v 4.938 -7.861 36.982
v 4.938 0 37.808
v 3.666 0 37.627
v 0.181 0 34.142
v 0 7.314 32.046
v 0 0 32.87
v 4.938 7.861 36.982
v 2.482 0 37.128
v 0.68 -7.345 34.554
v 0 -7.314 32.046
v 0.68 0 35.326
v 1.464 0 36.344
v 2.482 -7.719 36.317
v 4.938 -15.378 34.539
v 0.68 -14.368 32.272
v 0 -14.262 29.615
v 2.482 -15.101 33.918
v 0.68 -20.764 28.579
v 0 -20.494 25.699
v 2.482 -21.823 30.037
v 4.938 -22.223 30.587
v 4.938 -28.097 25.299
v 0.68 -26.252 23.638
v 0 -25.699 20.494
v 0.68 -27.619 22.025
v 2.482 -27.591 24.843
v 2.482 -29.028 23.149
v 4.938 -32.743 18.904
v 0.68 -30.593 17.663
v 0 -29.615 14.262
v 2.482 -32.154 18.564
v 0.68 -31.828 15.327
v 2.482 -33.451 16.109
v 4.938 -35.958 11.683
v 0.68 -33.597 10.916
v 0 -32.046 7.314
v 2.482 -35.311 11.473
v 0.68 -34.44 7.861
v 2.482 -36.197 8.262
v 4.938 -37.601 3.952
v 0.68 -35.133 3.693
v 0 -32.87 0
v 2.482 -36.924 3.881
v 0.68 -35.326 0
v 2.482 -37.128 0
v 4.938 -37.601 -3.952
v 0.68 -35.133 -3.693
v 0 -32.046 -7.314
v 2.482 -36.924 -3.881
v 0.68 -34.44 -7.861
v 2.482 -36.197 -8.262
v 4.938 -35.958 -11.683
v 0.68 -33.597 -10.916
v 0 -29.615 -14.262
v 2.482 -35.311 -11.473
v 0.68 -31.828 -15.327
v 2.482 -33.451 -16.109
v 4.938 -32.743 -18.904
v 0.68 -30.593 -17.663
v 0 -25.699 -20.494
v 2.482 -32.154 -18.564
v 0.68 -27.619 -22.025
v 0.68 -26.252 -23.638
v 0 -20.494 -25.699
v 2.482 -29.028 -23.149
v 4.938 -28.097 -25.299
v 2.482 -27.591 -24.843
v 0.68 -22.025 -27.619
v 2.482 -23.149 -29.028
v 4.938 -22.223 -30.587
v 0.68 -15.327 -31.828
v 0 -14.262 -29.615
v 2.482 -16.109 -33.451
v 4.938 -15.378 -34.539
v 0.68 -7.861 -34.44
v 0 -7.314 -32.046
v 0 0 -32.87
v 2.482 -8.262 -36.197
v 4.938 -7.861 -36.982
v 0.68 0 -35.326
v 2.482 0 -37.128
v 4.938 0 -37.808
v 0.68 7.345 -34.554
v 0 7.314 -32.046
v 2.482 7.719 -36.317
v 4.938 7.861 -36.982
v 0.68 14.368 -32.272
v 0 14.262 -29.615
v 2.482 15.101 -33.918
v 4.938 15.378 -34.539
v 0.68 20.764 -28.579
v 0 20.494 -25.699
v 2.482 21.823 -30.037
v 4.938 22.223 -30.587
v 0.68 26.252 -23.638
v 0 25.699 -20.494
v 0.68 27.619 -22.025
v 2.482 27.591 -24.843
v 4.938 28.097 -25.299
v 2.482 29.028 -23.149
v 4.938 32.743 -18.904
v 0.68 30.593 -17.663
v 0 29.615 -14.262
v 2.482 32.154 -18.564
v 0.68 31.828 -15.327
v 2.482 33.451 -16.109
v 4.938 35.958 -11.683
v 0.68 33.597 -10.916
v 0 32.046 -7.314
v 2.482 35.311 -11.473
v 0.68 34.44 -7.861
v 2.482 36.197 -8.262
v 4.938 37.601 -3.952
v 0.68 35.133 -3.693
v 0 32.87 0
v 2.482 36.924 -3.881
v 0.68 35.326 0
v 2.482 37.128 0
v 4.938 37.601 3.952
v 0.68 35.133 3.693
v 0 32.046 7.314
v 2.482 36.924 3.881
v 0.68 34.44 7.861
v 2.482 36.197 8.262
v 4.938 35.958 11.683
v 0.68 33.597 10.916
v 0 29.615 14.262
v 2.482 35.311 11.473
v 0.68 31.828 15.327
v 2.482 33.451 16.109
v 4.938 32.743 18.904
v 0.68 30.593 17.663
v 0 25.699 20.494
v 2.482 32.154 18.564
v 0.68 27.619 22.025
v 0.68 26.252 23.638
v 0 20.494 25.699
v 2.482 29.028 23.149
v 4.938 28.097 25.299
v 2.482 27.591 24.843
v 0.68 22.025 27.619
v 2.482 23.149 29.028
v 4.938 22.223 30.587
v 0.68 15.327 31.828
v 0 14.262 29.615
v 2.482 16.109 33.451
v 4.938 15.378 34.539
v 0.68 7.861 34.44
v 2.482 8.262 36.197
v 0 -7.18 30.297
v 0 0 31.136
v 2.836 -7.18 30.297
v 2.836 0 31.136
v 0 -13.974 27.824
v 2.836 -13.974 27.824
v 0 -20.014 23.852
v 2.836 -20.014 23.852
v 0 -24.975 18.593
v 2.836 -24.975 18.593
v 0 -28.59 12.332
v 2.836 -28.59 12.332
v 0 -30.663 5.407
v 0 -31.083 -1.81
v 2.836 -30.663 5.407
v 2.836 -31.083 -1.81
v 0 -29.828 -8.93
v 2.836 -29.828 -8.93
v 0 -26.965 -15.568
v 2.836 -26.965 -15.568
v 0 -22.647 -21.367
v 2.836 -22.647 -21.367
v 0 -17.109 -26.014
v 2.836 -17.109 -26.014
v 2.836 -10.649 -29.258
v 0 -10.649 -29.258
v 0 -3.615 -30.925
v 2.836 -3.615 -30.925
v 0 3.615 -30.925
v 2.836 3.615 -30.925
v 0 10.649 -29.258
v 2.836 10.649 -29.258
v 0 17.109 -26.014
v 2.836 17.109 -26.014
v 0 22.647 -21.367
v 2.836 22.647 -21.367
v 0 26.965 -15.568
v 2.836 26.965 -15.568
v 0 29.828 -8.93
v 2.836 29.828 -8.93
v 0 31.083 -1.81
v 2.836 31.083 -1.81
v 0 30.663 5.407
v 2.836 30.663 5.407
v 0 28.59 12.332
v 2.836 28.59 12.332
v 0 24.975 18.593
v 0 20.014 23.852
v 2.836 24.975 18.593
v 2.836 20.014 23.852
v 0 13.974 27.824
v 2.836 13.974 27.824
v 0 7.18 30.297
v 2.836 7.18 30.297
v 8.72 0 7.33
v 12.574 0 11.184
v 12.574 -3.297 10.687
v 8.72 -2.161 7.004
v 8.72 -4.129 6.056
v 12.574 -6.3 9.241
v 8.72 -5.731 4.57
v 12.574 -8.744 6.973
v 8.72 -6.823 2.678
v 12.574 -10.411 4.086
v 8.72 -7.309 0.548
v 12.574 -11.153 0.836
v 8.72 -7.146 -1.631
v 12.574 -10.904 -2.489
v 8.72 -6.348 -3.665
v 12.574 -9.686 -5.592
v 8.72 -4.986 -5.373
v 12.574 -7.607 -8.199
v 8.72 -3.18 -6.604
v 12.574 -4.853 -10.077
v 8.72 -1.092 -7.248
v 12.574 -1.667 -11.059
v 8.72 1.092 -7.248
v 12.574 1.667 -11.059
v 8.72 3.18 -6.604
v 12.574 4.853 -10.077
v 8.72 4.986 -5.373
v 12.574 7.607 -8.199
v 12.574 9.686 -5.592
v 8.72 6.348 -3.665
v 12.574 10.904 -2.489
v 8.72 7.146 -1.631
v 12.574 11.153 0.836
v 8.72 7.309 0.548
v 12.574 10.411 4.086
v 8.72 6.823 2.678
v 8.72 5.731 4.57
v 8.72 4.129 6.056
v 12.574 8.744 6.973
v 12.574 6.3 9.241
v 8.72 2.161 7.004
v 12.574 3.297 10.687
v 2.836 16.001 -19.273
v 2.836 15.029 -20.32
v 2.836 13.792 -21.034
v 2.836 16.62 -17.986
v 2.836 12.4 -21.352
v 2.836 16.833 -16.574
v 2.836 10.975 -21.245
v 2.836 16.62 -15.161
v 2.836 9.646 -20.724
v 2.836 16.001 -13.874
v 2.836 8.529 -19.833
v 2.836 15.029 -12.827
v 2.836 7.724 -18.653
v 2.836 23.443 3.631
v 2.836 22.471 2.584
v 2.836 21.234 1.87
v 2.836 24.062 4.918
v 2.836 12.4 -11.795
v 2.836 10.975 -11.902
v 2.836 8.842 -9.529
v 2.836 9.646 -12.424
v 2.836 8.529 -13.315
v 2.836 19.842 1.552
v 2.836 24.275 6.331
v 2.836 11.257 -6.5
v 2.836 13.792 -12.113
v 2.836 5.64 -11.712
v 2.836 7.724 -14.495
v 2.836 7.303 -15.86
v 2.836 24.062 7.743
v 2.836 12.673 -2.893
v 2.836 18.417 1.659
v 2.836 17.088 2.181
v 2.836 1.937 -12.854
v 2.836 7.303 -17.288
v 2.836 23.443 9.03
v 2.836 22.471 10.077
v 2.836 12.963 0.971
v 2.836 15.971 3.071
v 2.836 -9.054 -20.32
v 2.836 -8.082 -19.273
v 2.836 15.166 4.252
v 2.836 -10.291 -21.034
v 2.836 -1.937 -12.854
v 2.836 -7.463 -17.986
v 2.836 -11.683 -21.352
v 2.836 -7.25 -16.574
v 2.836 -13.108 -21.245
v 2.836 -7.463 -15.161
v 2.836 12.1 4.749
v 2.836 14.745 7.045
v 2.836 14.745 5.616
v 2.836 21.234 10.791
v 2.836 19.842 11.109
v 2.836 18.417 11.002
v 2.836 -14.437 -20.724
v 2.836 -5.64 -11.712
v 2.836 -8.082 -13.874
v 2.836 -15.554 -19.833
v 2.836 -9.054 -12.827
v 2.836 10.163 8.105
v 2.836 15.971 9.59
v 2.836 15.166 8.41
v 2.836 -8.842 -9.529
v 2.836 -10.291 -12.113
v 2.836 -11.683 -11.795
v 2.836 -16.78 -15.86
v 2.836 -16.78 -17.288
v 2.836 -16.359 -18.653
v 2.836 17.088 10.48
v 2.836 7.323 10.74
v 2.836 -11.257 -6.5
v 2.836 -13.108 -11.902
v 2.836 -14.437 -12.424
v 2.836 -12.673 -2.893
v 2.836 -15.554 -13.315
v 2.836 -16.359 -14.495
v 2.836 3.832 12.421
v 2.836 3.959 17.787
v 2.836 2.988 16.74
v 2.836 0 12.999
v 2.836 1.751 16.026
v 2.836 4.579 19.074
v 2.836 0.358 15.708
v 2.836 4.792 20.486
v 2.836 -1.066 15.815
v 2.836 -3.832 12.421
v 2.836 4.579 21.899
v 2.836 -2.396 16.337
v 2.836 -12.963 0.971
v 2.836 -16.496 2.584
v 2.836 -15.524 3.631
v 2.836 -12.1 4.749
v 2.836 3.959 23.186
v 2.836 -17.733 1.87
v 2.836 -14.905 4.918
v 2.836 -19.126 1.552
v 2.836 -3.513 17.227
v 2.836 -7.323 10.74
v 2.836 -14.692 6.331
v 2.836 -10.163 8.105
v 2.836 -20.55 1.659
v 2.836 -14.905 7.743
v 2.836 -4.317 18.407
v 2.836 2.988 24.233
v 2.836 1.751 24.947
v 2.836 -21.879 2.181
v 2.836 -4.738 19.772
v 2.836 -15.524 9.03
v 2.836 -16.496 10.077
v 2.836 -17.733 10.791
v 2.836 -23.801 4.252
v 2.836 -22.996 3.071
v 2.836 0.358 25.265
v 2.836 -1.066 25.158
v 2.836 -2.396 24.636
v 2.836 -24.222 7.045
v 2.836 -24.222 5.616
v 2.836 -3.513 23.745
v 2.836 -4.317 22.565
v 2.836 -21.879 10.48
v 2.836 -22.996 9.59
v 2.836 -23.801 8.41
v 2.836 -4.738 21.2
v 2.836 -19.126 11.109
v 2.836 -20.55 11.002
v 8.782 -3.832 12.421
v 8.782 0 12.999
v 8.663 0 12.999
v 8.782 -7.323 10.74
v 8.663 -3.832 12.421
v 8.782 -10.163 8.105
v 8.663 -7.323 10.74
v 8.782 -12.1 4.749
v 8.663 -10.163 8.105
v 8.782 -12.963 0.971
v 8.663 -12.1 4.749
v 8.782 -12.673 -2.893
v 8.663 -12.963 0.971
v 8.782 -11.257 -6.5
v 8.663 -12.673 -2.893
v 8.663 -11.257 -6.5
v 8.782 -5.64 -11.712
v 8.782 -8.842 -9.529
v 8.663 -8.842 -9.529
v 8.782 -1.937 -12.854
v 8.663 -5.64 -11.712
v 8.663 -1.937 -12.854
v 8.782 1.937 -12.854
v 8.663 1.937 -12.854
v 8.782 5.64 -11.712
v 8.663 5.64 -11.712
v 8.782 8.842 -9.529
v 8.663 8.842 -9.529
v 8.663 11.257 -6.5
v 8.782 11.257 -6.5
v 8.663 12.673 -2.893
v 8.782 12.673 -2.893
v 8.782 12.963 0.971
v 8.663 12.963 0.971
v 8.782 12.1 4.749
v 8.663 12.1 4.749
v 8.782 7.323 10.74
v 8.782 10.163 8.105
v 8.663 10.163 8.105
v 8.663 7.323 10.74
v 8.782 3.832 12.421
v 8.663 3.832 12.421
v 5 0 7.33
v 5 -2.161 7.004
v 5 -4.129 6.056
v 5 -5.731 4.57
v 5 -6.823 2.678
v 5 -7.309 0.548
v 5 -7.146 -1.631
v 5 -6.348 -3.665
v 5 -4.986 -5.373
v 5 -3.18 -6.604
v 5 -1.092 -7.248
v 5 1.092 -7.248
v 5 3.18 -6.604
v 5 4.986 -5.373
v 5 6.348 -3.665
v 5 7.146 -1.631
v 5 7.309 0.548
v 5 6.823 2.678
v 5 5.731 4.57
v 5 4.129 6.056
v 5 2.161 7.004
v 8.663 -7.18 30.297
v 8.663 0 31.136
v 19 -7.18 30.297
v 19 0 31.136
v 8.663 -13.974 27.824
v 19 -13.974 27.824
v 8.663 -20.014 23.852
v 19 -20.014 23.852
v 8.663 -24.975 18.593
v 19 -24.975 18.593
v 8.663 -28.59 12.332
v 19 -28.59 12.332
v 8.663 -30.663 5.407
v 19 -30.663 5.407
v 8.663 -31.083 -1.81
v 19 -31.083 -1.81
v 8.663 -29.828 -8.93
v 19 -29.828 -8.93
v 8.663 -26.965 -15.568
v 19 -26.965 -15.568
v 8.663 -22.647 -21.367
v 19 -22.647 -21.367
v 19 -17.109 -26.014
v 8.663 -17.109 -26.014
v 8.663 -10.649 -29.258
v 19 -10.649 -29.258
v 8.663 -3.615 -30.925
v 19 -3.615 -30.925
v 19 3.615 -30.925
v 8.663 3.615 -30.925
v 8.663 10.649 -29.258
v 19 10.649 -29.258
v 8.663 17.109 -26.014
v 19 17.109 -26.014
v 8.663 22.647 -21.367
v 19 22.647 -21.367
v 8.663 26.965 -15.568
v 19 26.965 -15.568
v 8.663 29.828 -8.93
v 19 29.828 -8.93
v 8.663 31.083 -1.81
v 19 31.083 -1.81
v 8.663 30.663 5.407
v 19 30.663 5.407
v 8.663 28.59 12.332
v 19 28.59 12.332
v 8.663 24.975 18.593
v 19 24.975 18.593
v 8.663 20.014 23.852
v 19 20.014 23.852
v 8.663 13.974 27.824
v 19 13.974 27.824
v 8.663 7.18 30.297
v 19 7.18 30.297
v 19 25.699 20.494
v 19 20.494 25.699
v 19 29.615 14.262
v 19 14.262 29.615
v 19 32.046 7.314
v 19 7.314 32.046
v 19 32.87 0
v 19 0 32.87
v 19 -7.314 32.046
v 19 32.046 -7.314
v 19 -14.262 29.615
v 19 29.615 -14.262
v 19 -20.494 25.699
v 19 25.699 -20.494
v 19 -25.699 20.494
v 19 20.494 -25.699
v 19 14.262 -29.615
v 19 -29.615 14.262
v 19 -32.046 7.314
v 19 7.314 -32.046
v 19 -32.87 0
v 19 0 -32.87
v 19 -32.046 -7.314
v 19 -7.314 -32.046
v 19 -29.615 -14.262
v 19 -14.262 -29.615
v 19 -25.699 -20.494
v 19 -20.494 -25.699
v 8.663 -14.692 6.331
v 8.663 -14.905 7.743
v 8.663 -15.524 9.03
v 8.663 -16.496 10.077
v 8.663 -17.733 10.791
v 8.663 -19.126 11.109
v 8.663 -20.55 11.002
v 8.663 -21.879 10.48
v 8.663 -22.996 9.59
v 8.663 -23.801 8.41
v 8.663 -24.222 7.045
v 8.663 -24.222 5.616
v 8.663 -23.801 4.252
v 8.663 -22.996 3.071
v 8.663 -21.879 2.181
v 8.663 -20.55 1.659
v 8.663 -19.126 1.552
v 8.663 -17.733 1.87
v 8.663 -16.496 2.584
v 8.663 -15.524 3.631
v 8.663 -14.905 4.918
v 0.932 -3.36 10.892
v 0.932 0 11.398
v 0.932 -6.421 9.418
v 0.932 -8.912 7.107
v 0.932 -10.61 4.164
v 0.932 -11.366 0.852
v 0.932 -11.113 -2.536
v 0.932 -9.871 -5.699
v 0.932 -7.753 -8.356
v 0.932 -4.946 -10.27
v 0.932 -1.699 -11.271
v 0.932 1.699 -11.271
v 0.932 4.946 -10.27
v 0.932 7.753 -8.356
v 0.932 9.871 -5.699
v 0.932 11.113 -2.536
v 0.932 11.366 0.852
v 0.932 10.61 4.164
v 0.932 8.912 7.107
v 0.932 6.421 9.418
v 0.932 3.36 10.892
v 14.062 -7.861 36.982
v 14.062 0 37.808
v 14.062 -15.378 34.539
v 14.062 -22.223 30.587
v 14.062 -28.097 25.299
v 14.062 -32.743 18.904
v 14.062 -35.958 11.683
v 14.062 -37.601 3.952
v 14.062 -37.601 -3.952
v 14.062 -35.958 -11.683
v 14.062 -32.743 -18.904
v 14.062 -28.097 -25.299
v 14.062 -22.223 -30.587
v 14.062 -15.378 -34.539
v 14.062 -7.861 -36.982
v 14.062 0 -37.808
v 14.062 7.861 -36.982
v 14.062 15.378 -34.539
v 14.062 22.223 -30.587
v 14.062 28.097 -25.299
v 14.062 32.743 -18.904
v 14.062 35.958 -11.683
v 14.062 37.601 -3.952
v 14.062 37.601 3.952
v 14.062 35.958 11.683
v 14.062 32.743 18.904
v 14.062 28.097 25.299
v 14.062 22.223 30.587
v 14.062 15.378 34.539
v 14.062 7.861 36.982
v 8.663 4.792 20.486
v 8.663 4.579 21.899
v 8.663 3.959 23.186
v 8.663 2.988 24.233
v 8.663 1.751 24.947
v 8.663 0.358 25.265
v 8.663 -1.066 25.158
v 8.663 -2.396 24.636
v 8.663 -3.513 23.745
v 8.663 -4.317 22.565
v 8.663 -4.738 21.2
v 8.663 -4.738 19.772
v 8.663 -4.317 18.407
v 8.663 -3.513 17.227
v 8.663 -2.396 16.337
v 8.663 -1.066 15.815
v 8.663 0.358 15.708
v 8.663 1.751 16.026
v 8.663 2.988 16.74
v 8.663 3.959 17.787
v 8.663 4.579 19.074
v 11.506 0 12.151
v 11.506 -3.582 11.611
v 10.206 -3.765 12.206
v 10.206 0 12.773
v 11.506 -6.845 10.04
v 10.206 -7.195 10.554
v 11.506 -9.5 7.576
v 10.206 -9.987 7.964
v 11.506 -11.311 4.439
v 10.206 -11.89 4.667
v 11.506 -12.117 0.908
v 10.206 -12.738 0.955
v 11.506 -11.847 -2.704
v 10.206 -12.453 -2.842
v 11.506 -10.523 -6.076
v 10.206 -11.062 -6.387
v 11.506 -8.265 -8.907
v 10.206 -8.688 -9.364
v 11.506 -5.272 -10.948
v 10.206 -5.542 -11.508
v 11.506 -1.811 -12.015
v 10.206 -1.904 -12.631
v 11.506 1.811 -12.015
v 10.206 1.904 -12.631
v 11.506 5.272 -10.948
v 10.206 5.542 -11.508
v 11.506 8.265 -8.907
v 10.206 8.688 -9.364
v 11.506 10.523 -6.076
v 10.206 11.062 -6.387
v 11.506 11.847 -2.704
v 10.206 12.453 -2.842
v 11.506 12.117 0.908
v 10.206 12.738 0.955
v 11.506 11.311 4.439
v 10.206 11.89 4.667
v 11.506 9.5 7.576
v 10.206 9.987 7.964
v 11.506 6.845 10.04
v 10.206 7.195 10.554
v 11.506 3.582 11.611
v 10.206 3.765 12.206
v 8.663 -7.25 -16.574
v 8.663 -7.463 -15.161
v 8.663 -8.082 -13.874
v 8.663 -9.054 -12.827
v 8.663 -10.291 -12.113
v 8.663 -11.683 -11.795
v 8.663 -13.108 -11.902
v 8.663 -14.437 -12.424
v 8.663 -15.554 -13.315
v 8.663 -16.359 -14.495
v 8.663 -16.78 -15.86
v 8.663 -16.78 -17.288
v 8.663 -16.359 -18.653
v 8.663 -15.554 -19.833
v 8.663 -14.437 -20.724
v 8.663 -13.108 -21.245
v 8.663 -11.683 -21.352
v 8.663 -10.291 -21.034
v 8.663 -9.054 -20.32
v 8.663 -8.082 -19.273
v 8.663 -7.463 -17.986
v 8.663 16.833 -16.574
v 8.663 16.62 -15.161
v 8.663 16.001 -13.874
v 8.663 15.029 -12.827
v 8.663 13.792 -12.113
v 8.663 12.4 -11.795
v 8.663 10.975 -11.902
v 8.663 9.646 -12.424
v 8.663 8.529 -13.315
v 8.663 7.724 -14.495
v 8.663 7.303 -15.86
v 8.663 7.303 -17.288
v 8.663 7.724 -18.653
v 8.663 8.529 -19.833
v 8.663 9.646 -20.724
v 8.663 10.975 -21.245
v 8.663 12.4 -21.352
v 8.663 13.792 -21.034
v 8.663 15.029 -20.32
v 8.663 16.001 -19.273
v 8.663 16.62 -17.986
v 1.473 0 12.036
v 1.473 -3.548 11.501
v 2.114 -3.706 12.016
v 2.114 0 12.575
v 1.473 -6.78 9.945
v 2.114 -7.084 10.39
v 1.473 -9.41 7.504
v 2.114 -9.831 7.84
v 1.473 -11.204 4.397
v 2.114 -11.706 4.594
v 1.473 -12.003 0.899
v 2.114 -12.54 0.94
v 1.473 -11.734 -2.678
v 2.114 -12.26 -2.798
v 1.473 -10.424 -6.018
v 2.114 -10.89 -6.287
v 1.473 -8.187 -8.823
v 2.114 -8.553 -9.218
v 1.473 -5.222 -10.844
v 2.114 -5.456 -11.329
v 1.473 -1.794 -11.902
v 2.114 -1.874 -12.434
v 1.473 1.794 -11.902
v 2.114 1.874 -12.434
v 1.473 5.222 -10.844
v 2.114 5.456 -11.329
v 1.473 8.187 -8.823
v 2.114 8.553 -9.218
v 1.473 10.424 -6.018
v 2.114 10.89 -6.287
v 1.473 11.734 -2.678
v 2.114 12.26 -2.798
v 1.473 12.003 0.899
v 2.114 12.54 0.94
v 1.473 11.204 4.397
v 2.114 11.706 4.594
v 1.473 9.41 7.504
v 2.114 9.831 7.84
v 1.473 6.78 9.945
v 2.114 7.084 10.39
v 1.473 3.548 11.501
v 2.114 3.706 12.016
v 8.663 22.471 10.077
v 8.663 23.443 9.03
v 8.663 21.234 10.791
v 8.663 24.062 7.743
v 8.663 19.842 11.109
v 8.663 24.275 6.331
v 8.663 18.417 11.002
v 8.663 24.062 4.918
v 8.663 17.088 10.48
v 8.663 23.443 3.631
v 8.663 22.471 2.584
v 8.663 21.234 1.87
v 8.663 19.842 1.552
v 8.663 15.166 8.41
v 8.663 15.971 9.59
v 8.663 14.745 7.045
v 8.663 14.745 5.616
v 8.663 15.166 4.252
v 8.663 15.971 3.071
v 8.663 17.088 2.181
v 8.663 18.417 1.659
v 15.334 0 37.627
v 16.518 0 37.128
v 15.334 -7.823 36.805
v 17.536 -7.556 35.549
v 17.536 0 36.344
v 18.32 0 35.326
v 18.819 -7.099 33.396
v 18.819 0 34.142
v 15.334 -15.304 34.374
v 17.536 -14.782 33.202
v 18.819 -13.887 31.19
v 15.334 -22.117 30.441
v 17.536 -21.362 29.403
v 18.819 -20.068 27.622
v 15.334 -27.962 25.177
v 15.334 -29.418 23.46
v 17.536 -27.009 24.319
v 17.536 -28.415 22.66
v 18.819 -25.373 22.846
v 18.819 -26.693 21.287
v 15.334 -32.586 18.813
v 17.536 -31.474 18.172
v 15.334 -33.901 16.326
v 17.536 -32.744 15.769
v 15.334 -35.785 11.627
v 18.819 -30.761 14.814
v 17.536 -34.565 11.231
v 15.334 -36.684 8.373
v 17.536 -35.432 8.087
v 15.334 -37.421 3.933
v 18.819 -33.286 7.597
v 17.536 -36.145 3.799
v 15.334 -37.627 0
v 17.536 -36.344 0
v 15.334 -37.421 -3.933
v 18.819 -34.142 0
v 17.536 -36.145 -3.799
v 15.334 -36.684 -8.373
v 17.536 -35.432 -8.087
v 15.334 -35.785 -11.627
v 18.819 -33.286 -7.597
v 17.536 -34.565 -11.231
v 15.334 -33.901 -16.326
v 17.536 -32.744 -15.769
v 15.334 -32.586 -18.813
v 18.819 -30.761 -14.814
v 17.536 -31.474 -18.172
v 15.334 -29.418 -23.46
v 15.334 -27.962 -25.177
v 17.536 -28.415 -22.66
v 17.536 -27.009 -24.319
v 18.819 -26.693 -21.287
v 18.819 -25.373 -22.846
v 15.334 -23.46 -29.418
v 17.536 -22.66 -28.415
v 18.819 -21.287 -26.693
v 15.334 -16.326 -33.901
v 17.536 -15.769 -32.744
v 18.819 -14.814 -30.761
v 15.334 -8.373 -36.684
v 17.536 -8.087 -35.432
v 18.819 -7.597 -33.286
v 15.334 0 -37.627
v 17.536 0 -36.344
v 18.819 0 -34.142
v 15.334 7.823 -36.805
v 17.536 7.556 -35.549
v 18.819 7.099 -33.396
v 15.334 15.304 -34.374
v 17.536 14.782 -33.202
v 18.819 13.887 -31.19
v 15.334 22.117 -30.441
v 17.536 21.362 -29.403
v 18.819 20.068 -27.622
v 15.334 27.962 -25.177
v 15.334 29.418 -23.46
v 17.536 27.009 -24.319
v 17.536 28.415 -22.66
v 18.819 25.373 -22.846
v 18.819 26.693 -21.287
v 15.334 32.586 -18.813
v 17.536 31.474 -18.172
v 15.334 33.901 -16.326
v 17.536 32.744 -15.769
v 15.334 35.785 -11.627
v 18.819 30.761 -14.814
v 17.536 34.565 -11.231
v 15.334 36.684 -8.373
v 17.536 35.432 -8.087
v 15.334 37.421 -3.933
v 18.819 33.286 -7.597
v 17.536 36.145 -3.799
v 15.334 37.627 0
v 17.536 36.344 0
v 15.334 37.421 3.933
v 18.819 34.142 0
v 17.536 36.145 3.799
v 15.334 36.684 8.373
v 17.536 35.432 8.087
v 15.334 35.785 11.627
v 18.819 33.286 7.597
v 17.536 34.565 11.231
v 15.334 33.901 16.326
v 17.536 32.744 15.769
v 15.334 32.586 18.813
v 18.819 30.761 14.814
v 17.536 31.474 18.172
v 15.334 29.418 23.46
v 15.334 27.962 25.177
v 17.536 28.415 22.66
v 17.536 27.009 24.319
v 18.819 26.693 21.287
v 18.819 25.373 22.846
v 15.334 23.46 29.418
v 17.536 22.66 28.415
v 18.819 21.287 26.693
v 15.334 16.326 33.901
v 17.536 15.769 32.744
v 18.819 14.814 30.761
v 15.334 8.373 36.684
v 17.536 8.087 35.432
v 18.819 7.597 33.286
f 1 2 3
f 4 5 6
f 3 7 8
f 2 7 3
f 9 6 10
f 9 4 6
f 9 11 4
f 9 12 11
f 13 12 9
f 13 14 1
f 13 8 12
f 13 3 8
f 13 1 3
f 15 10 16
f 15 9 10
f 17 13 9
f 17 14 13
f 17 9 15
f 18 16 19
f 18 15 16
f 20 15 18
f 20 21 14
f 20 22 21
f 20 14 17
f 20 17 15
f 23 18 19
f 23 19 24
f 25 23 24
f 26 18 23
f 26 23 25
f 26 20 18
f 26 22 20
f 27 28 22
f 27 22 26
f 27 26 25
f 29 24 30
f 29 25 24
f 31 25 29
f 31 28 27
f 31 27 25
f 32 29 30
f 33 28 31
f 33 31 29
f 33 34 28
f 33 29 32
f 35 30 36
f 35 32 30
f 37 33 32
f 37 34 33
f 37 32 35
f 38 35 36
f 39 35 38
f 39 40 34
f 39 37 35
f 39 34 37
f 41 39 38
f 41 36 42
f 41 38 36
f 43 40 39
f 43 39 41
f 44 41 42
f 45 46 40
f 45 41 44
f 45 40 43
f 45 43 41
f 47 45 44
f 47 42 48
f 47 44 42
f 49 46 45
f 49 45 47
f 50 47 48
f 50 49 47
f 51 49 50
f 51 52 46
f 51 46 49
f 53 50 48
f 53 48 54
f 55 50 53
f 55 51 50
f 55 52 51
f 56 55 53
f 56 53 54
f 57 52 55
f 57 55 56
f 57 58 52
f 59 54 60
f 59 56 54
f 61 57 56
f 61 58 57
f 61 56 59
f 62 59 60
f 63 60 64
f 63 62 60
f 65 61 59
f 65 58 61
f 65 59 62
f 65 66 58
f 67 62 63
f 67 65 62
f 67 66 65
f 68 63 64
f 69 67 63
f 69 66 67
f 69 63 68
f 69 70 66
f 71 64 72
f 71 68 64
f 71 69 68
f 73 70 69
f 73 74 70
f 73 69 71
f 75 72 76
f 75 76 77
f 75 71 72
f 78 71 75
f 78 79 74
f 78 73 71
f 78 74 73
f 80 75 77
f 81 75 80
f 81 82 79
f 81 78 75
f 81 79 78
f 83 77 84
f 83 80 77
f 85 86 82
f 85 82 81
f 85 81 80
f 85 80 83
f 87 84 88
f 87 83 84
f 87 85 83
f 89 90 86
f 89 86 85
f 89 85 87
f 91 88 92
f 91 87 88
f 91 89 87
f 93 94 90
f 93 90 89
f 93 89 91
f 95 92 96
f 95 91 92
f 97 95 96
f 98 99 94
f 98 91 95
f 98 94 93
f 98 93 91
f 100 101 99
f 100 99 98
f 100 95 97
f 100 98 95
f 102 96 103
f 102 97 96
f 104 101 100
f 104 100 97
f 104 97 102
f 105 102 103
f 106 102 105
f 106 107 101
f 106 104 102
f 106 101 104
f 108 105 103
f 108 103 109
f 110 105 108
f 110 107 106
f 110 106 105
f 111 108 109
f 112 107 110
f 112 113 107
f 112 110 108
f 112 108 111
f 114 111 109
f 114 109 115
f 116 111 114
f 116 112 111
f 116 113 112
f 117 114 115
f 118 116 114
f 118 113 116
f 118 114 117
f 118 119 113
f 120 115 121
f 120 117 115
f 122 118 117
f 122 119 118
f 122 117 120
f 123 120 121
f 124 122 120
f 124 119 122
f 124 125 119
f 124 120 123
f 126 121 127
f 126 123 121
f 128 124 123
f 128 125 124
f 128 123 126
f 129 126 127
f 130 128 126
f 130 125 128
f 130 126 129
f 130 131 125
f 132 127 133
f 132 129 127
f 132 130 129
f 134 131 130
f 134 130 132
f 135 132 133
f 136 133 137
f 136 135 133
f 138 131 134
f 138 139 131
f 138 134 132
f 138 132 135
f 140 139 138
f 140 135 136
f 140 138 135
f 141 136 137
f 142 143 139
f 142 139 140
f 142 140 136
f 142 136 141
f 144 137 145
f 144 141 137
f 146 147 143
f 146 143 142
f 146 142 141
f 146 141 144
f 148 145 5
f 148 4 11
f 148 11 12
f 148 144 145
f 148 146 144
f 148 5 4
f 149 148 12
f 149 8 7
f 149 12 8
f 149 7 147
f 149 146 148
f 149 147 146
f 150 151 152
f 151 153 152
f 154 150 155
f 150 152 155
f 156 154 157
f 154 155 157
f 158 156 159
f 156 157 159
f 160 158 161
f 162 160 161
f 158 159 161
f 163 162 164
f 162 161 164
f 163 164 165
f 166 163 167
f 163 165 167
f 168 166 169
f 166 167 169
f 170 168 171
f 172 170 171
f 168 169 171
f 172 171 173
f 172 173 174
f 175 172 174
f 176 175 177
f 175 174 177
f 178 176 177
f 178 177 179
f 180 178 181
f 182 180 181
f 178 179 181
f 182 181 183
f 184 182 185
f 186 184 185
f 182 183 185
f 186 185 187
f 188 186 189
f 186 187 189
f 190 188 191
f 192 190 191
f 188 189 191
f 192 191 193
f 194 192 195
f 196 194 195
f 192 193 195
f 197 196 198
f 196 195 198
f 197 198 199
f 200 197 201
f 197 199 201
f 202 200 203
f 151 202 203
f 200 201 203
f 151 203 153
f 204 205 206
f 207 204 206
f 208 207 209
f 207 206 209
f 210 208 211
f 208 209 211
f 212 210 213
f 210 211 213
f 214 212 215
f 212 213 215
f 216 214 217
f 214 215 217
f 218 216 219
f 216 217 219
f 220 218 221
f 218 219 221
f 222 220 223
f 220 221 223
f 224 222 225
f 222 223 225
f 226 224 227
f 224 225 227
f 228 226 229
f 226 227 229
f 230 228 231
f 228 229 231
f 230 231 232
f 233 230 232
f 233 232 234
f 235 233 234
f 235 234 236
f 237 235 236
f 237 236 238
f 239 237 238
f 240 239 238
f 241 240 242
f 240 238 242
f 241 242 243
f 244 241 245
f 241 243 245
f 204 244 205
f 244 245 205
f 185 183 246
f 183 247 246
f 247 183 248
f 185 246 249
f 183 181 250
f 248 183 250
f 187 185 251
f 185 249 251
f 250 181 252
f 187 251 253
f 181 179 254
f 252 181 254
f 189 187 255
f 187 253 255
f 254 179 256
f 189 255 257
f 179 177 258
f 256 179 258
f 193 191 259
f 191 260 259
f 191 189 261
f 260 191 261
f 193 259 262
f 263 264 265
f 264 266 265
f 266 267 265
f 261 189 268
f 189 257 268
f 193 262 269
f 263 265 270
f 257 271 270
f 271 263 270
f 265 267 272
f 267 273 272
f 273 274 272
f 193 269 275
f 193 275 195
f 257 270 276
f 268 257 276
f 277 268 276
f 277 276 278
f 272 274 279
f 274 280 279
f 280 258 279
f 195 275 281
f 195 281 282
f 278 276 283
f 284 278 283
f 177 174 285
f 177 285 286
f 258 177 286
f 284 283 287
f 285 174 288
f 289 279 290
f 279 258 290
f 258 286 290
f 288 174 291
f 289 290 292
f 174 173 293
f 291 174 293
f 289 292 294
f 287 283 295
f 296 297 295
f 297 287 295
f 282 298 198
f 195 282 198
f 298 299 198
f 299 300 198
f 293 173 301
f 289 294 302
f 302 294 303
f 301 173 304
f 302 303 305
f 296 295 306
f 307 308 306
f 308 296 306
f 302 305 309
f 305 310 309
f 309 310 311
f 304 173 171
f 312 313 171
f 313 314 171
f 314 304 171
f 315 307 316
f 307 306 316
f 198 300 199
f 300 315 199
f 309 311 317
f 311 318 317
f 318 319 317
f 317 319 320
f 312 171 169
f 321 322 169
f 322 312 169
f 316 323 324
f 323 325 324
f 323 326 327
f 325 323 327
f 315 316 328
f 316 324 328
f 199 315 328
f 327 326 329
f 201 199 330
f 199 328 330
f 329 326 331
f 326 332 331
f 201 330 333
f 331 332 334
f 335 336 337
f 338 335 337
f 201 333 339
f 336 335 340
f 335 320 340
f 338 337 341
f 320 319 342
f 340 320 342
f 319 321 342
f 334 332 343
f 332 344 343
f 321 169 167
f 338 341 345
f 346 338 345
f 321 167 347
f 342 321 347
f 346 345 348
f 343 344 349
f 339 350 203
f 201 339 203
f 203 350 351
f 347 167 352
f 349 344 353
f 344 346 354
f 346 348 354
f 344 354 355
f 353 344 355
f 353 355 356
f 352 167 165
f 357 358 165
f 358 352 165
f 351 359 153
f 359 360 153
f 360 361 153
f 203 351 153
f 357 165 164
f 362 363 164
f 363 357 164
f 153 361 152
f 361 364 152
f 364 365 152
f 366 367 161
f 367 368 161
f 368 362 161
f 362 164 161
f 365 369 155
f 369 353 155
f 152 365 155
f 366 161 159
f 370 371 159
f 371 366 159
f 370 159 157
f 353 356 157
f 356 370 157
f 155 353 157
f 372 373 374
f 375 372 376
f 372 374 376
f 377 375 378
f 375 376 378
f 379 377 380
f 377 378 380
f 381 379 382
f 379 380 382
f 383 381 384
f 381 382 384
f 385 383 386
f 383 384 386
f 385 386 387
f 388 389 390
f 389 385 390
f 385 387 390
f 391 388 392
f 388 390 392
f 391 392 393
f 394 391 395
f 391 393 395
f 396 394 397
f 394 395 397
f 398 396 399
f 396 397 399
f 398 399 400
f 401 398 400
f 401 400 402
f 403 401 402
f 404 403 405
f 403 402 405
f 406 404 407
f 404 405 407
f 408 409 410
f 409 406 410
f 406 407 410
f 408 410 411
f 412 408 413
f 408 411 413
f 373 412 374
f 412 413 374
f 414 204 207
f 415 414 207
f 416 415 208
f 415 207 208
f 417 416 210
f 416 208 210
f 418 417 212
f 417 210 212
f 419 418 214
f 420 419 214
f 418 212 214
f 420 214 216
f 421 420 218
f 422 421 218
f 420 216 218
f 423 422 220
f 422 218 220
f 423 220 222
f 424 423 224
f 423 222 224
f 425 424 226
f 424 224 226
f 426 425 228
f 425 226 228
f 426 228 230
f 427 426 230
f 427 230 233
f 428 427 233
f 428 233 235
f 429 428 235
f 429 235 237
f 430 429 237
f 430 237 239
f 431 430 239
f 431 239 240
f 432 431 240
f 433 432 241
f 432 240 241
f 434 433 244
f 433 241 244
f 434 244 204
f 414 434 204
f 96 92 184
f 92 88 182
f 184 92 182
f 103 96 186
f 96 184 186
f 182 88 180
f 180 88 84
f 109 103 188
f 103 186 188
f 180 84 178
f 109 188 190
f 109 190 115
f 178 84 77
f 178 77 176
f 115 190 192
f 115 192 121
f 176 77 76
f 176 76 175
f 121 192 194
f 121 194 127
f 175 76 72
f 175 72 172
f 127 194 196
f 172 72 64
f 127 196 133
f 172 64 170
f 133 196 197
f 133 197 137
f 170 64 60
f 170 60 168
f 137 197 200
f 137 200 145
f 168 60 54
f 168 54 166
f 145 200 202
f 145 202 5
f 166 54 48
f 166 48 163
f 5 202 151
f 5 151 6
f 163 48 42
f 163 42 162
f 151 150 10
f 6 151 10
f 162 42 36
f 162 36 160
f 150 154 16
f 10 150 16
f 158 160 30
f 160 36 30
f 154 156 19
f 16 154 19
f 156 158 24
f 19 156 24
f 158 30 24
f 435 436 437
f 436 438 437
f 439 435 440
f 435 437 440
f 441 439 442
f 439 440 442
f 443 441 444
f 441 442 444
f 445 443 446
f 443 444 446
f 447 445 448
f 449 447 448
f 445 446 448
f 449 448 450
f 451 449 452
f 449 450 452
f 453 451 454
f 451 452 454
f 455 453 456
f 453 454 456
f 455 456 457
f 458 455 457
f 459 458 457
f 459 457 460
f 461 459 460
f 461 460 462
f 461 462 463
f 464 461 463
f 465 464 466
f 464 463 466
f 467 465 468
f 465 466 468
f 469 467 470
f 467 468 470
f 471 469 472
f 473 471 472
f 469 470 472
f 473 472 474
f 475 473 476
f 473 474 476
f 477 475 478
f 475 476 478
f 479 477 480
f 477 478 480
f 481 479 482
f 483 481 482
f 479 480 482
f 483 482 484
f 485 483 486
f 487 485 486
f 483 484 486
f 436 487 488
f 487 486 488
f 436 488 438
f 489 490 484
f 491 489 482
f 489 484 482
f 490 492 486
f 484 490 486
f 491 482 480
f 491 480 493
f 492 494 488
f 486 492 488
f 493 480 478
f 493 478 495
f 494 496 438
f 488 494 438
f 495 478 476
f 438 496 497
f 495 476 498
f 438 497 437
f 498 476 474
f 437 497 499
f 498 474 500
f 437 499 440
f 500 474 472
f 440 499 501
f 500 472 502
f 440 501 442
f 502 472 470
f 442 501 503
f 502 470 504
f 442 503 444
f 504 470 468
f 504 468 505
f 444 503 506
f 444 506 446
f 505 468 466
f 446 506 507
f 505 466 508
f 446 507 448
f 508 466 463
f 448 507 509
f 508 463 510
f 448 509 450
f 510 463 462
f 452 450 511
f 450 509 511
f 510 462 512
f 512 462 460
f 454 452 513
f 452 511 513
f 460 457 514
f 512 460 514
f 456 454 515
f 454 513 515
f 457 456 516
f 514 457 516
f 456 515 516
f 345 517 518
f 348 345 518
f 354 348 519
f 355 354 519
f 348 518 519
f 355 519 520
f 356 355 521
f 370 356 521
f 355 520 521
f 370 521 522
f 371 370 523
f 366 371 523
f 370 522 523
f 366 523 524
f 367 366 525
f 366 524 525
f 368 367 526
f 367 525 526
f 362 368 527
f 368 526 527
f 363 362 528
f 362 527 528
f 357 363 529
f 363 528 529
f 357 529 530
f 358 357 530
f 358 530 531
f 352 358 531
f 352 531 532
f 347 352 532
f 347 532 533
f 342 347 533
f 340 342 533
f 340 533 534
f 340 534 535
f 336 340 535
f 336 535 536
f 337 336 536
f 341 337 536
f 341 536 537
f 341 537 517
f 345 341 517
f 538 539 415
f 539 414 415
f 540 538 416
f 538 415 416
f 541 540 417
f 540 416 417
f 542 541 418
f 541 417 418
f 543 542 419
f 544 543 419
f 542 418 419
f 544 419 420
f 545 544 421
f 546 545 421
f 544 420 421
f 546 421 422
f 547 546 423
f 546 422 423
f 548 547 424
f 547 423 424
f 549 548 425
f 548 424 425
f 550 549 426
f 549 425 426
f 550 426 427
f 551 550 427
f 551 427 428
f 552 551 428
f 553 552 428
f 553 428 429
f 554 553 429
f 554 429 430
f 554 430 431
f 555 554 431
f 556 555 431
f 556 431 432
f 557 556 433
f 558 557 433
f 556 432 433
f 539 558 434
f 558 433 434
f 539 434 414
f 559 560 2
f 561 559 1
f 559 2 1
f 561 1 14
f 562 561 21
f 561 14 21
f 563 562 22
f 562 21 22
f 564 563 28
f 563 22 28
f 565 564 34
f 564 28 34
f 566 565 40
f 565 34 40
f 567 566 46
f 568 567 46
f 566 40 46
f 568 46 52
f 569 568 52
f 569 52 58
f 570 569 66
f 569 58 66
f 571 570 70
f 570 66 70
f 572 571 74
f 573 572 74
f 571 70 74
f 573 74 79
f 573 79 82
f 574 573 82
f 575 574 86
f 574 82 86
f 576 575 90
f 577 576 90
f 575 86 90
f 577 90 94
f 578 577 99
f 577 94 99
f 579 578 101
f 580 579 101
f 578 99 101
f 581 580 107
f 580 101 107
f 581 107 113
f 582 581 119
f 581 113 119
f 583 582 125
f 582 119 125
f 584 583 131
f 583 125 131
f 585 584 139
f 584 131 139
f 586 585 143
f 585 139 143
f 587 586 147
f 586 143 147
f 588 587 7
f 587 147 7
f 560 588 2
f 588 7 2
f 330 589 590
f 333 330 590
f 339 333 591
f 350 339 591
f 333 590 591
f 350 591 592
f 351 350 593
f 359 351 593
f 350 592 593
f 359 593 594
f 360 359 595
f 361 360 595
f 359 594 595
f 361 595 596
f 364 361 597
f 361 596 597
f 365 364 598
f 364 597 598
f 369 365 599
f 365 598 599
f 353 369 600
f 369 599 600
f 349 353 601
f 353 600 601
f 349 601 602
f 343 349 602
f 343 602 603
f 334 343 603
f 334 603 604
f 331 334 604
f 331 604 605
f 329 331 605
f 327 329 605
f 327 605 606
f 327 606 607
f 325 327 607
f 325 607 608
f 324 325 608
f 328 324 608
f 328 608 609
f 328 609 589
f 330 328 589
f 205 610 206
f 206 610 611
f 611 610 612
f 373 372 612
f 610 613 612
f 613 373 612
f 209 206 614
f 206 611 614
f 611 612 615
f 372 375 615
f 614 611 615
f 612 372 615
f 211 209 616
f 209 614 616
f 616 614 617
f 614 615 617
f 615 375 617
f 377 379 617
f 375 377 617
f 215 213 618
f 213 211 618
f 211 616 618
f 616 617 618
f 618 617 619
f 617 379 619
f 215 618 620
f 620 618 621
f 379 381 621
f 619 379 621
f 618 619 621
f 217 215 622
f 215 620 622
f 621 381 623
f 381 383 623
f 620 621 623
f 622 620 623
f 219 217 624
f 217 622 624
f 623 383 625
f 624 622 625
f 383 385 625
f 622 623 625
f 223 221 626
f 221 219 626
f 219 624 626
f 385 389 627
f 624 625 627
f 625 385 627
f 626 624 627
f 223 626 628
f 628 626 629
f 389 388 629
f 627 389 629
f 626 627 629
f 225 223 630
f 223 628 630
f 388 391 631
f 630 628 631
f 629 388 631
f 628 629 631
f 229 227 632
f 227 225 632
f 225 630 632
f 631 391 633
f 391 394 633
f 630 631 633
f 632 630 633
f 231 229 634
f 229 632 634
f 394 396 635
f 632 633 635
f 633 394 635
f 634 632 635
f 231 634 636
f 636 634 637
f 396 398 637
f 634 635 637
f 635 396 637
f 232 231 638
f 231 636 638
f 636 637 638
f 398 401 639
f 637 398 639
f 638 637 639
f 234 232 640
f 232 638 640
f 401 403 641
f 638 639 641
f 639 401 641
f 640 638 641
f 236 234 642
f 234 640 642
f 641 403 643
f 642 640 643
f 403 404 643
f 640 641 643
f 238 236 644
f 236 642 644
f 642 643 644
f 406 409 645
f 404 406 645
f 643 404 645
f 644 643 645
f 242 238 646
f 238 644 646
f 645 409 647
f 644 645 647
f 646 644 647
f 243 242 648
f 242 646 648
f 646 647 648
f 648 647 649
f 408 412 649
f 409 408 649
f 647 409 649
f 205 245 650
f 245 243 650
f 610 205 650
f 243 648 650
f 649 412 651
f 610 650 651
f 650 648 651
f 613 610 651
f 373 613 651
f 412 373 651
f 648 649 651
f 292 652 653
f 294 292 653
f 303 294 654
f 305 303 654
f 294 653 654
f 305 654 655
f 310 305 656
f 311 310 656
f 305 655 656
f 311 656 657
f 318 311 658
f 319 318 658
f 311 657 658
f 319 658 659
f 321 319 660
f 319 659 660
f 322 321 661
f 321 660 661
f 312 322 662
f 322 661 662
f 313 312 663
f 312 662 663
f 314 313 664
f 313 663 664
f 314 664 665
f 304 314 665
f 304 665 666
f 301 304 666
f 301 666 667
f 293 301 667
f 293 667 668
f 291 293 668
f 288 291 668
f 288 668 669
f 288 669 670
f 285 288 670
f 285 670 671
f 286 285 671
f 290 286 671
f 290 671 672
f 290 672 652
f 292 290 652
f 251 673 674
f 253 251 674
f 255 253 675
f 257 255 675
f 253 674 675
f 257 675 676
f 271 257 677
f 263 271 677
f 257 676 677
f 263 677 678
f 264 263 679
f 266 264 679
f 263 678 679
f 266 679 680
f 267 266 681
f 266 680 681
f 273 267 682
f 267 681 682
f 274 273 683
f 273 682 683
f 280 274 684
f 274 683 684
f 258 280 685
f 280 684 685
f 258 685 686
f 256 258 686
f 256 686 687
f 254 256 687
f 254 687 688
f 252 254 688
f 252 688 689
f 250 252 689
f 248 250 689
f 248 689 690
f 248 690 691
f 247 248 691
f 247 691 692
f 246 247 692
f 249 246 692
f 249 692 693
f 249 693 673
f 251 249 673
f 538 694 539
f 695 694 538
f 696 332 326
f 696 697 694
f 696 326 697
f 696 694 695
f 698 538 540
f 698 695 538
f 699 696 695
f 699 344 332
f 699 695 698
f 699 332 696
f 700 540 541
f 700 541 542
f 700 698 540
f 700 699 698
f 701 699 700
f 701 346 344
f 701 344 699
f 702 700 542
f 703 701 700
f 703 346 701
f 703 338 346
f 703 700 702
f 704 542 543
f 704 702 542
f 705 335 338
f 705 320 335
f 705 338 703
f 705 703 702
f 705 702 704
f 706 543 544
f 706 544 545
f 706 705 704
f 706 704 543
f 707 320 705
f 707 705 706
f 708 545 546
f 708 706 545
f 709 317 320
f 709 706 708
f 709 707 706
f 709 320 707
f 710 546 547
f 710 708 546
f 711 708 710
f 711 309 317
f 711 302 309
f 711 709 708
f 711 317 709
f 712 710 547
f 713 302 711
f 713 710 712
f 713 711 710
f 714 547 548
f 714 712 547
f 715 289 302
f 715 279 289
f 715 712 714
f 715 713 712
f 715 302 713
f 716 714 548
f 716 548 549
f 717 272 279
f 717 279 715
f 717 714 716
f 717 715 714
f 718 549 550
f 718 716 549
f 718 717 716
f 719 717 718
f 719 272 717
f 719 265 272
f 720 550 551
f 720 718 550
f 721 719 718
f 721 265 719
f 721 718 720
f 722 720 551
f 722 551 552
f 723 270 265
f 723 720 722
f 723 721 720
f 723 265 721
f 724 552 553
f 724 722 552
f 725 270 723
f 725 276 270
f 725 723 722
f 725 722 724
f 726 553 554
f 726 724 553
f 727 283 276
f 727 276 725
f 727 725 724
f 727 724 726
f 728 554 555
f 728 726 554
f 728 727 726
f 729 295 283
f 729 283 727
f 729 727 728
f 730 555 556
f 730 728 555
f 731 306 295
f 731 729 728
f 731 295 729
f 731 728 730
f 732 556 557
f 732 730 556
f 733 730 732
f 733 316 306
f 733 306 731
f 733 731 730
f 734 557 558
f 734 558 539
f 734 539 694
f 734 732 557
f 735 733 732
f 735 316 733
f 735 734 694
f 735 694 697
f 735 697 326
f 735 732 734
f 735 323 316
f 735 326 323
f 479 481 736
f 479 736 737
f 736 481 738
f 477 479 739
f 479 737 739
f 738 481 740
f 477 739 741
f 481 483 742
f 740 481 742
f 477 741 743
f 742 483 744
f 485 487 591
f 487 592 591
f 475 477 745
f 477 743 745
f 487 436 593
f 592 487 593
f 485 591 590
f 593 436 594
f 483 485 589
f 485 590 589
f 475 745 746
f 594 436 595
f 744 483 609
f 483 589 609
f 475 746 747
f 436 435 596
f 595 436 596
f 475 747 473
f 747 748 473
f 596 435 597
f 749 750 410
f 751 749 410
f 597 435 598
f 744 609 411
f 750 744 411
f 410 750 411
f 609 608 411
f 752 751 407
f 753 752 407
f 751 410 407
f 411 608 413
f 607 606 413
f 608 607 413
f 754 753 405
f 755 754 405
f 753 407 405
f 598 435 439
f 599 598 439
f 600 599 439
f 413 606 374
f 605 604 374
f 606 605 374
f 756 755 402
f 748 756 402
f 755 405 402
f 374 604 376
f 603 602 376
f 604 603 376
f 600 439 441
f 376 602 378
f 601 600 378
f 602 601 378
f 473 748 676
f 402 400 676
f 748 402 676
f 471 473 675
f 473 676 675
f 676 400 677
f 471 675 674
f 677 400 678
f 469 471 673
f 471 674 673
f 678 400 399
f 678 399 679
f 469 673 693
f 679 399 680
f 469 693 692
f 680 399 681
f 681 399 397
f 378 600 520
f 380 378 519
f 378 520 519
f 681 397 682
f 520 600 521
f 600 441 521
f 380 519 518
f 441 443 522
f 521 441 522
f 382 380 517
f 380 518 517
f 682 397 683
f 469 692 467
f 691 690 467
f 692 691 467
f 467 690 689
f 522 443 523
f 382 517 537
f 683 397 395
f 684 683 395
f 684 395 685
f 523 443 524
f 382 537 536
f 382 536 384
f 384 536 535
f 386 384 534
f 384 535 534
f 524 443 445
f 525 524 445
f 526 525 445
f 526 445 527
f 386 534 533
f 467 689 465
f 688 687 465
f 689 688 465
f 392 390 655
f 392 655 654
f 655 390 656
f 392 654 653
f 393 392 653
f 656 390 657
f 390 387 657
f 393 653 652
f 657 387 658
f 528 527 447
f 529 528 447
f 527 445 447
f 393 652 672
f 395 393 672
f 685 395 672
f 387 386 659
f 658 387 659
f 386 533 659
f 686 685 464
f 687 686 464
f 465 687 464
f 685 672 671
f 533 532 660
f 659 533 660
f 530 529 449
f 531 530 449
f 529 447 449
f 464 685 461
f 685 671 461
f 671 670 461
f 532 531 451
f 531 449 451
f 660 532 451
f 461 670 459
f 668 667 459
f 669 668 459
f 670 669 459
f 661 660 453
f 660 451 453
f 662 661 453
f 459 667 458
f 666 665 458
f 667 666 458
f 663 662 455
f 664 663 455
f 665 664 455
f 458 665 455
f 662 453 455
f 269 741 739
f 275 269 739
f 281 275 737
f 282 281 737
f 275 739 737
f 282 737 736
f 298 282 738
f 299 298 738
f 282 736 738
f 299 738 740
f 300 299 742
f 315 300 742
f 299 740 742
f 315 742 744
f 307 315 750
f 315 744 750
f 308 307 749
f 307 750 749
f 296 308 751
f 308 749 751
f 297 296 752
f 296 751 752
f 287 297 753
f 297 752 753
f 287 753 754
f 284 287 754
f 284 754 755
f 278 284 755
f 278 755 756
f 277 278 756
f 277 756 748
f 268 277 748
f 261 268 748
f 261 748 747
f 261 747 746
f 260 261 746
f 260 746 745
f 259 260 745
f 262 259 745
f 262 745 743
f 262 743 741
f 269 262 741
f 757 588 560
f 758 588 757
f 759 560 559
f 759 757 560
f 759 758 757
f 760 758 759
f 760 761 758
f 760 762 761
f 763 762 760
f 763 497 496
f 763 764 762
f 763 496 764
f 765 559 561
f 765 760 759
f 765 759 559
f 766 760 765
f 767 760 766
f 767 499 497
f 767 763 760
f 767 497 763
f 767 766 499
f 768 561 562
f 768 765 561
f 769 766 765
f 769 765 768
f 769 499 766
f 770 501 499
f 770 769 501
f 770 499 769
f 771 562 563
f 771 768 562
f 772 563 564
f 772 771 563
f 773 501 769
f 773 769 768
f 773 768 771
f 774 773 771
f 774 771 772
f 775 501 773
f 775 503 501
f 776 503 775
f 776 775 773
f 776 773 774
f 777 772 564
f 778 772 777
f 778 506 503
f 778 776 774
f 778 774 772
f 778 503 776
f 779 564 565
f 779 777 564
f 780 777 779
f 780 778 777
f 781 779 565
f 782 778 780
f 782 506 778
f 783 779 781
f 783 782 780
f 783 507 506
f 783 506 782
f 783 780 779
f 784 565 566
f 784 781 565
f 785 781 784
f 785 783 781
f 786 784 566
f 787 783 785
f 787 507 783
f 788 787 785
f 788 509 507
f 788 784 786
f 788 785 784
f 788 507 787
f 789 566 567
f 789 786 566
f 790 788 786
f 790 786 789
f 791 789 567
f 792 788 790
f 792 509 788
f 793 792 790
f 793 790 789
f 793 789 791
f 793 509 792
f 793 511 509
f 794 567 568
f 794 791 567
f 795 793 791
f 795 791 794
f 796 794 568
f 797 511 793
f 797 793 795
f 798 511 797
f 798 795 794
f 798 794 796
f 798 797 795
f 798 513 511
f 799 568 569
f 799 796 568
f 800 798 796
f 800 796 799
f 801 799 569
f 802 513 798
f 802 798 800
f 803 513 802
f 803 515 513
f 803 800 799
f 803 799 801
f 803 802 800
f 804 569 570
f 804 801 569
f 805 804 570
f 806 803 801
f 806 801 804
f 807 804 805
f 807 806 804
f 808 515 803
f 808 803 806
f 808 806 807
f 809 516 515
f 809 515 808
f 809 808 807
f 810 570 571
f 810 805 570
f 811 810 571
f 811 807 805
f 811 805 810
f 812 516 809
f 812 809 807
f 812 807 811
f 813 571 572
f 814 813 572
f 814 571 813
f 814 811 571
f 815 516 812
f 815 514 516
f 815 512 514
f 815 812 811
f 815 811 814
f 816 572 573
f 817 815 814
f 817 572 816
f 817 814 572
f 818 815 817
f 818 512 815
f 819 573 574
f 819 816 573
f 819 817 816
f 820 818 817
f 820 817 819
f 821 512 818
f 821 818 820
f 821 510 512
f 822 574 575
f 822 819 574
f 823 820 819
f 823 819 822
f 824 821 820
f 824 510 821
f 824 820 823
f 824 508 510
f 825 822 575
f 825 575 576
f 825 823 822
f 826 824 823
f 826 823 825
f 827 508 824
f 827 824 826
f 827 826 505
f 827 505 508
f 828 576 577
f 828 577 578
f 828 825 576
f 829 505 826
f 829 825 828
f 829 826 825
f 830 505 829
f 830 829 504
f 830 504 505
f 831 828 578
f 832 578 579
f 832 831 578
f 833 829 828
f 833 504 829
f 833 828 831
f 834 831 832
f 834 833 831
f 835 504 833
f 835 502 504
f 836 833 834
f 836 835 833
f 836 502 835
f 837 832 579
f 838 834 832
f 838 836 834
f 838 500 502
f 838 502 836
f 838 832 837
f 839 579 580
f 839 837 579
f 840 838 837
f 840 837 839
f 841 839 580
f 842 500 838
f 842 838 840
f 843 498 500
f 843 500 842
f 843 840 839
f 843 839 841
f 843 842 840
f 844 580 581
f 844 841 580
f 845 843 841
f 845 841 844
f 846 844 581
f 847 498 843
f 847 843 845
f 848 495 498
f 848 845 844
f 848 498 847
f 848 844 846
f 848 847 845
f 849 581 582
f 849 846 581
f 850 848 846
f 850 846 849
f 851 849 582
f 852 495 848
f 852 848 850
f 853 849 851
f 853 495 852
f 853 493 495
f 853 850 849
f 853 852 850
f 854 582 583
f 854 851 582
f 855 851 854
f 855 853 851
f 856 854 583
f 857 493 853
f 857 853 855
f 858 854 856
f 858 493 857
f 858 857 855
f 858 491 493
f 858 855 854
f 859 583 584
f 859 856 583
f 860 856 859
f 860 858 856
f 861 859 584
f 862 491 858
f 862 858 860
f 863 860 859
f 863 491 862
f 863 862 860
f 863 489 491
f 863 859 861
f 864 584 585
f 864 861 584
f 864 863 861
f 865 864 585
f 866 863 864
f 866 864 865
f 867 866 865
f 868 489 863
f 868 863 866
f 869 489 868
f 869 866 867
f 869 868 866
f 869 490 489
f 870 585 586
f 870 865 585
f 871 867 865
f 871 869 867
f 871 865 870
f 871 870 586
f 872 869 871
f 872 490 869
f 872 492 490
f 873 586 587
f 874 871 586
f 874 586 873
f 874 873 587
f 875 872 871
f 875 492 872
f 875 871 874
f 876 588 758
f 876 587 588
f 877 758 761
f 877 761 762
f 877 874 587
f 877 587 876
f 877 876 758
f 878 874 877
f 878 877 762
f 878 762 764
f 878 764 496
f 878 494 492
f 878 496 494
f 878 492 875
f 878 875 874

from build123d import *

# Parameters (mm, degrees)
F2_R     = 4.7917393222
F3_DEPTH = 25


# Not quite as in the source:
# - a fillet or chamfer that OpenCascade refuses, or shapes differently, is made with other operations: its cross-section is extruded or revolved along the edge and cut away or added


with BuildPart() as f1:
    # F0 (on Front) → F1 (revolve)
    with BuildSketch(Plane.XZ):
        Polygon((0, 12.9990037531), (0, 7.3299529031), (13.7201668695, 7.3299529031), (13.7201668695, 12.9990037531), (8.6628543213, 12.9990037531), (8.6628543213, 31.1359390616), (18.9999677241, 31.1359390616), (18.9999677241, 37.8080755472), (0, 37.8080755472), (0, 31.1359390616), (2.8364819009, 31.1359390616), (2.8364819009, 12.9990037531), align=None)
    revolve(axis=Axis((6.8600834347, 0, 0), (1, 0, 0)))

    # F2 (on face) → F3 (cut)
    with BuildSketch(Plane.YZ.offset(8.6628543213)):
        with Locations((-19.483606852, 6.3306076199)):
            Circle(F2_R)
        with Locations((0, 20.4862765968)):
            Circle(F2_R)
        with Locations((19.483606852, 6.3306076199)):
            Circle(F2_R)
        with Locations((12.041531258, -16.5737459183)):
            Circle(F2_R)
        with Locations((-12.041531258, -16.5737459183)):
            Circle(F2_R)
    extrude(amount=-F3_DEPTH, mode=Mode.SUBTRACT)

    # F4: fillet of radius 5 on 4 edges, made by hand

    # F4_s1 → F4_t2 (revolve, cut)
    with BuildSketch(Plane.XZ):
        with BuildLine():
            ThreePointArc((-0.0004, 32.8071098618), (1.4644660941, 36.3436094532), (5.0009656854, 37.8084755472))
            Line((5.0009656854, 37.8084755472), (5.0009656854, 38.3086121158))
            ThreePointArc((5.0009656854, 38.3086121158), (2.5004828427, 38.3082121158), (0, 38.3082121158))
            Line((0, 38.3082121158), (-0.5001365685, 37.8080755472))
            ThreePointArc((-0.5001365685, 37.8080755472), (-0.5001365685, 35.3075927045), (-0.5005365685, 32.8071098618))
            Line((-0.5005365685, 32.8071098618), (-0.0004, 32.8071098618))
        make_face()
    revolve(axis=Axis((0, 0, 0), (1, 0, 0)), mode=Mode.SUBTRACT)

    # F4_s3 → F4_t4 (revolve, cut)
    with BuildSketch(Plane.XZ):
        with BuildLine():
            ThreePointArc((13.9990020387, 37.8084755472), (17.53550163, 36.3436094532), (19.0003677241, 32.8071098618))
            Line((19.0003677241, 32.8071098618), (19.5005042926, 32.8071098618))
            ThreePointArc((19.5005042926, 32.8071098618), (19.5001042926, 35.3075927045), (19.5001042926, 37.8080755472))
            Line((19.5001042926, 37.8080755472), (18.9999677241, 38.3082121158))
            ThreePointArc((18.9999677241, 38.3082121158), (16.4994848814, 38.3082121158), (13.9990020387, 38.3086121158))
            Line((13.9990020387, 38.3086121158), (13.9990020387, 37.8084755472))
        make_face()
    revolve(axis=Axis((18.9999677241, 0, 0), (1, 0, 0)), mode=Mode.SUBTRACT)

    # F4_s5 → F4_t6 (revolve, cut)
    with BuildSketch(Plane.XZ):
        with BuildLine():
            ThreePointArc((-0.0004, 8.490714972), (0.7677695224, 11.1541167376), (2.8363087756, 12.9993643465))
            Line((2.8363087756, 12.9993643465), (2.6198430846, 13.450229284))
            ThreePointArc((2.6198430846, 13.450229284), (1.4181543878, 13.4991403216), (0, 13.4991403216))
            Line((0, 13.4991403216), (-0.5001365685, 12.9990037531))
            ThreePointArc((-0.5001365685, 12.9990037531), (-0.5001365685, 10.7448593625), (-0.5005365685, 8.490714972))
            Line((-0.5005365685, 8.490714972), (-0.0004, 8.490714972))
        make_face()
    revolve(axis=Axis((0, 0, 0), (1, 0, 0)), mode=Mode.SUBTRACT)

    # F4_s7 → F4_t8 (revolve, cut)
    with BuildSketch(Plane.XZ):
        with BuildLine():
            ThreePointArc((13.7205668695, 7.9980380676), (12.2557007754, 11.534537659), (8.719201184, 12.9994037531))
            Line((8.719201184, 12.9994037531), (8.719201184, 13.4995403216))
            ThreePointArc((8.719201184, 13.4995403216), (11.2196840267, 13.4991403216), (13.7201668695, 13.4991403216))
            Line((13.7201668695, 13.4991403216), (14.220303438, 12.9990037531))
            ThreePointArc((14.220303438, 12.9990037531), (14.220303438, 10.4985209104), (14.220703438, 7.9980380676))
            Line((14.220703438, 7.9980380676), (13.7205668695, 7.9980380676))
        make_face()
    revolve(axis=Axis((13.7201668695, 0, 0), (1, 0, 0)), mode=Mode.SUBTRACT)

    # F5: chamfer of 5 on 3 edges, made by hand

    # F5_s1 → F5_t2 (revolve, cut)
    with BuildSketch(Plane.XZ):
        Polygon((0, 12.3299529031), (5, 7.3299529031), (0, 7.3299529031), align=None)
    revolve(axis=Axis((0, 0, 0), (1, 0, 0)), mode=Mode.SUBTRACT)

    # F5_s3 → F5_t4 (revolve, cut)
    with BuildSketch(Plane.XZ):
        Polygon((8.7201668695, 7.3299529031), (13.7201668695, 12.3299529031), (13.7201668695, 7.3299529031), align=None)
    revolve(axis=Axis((13.7201668695, 0, 0), (1, 0, 0)), mode=Mode.SUBTRACT)


solid = f1.part
